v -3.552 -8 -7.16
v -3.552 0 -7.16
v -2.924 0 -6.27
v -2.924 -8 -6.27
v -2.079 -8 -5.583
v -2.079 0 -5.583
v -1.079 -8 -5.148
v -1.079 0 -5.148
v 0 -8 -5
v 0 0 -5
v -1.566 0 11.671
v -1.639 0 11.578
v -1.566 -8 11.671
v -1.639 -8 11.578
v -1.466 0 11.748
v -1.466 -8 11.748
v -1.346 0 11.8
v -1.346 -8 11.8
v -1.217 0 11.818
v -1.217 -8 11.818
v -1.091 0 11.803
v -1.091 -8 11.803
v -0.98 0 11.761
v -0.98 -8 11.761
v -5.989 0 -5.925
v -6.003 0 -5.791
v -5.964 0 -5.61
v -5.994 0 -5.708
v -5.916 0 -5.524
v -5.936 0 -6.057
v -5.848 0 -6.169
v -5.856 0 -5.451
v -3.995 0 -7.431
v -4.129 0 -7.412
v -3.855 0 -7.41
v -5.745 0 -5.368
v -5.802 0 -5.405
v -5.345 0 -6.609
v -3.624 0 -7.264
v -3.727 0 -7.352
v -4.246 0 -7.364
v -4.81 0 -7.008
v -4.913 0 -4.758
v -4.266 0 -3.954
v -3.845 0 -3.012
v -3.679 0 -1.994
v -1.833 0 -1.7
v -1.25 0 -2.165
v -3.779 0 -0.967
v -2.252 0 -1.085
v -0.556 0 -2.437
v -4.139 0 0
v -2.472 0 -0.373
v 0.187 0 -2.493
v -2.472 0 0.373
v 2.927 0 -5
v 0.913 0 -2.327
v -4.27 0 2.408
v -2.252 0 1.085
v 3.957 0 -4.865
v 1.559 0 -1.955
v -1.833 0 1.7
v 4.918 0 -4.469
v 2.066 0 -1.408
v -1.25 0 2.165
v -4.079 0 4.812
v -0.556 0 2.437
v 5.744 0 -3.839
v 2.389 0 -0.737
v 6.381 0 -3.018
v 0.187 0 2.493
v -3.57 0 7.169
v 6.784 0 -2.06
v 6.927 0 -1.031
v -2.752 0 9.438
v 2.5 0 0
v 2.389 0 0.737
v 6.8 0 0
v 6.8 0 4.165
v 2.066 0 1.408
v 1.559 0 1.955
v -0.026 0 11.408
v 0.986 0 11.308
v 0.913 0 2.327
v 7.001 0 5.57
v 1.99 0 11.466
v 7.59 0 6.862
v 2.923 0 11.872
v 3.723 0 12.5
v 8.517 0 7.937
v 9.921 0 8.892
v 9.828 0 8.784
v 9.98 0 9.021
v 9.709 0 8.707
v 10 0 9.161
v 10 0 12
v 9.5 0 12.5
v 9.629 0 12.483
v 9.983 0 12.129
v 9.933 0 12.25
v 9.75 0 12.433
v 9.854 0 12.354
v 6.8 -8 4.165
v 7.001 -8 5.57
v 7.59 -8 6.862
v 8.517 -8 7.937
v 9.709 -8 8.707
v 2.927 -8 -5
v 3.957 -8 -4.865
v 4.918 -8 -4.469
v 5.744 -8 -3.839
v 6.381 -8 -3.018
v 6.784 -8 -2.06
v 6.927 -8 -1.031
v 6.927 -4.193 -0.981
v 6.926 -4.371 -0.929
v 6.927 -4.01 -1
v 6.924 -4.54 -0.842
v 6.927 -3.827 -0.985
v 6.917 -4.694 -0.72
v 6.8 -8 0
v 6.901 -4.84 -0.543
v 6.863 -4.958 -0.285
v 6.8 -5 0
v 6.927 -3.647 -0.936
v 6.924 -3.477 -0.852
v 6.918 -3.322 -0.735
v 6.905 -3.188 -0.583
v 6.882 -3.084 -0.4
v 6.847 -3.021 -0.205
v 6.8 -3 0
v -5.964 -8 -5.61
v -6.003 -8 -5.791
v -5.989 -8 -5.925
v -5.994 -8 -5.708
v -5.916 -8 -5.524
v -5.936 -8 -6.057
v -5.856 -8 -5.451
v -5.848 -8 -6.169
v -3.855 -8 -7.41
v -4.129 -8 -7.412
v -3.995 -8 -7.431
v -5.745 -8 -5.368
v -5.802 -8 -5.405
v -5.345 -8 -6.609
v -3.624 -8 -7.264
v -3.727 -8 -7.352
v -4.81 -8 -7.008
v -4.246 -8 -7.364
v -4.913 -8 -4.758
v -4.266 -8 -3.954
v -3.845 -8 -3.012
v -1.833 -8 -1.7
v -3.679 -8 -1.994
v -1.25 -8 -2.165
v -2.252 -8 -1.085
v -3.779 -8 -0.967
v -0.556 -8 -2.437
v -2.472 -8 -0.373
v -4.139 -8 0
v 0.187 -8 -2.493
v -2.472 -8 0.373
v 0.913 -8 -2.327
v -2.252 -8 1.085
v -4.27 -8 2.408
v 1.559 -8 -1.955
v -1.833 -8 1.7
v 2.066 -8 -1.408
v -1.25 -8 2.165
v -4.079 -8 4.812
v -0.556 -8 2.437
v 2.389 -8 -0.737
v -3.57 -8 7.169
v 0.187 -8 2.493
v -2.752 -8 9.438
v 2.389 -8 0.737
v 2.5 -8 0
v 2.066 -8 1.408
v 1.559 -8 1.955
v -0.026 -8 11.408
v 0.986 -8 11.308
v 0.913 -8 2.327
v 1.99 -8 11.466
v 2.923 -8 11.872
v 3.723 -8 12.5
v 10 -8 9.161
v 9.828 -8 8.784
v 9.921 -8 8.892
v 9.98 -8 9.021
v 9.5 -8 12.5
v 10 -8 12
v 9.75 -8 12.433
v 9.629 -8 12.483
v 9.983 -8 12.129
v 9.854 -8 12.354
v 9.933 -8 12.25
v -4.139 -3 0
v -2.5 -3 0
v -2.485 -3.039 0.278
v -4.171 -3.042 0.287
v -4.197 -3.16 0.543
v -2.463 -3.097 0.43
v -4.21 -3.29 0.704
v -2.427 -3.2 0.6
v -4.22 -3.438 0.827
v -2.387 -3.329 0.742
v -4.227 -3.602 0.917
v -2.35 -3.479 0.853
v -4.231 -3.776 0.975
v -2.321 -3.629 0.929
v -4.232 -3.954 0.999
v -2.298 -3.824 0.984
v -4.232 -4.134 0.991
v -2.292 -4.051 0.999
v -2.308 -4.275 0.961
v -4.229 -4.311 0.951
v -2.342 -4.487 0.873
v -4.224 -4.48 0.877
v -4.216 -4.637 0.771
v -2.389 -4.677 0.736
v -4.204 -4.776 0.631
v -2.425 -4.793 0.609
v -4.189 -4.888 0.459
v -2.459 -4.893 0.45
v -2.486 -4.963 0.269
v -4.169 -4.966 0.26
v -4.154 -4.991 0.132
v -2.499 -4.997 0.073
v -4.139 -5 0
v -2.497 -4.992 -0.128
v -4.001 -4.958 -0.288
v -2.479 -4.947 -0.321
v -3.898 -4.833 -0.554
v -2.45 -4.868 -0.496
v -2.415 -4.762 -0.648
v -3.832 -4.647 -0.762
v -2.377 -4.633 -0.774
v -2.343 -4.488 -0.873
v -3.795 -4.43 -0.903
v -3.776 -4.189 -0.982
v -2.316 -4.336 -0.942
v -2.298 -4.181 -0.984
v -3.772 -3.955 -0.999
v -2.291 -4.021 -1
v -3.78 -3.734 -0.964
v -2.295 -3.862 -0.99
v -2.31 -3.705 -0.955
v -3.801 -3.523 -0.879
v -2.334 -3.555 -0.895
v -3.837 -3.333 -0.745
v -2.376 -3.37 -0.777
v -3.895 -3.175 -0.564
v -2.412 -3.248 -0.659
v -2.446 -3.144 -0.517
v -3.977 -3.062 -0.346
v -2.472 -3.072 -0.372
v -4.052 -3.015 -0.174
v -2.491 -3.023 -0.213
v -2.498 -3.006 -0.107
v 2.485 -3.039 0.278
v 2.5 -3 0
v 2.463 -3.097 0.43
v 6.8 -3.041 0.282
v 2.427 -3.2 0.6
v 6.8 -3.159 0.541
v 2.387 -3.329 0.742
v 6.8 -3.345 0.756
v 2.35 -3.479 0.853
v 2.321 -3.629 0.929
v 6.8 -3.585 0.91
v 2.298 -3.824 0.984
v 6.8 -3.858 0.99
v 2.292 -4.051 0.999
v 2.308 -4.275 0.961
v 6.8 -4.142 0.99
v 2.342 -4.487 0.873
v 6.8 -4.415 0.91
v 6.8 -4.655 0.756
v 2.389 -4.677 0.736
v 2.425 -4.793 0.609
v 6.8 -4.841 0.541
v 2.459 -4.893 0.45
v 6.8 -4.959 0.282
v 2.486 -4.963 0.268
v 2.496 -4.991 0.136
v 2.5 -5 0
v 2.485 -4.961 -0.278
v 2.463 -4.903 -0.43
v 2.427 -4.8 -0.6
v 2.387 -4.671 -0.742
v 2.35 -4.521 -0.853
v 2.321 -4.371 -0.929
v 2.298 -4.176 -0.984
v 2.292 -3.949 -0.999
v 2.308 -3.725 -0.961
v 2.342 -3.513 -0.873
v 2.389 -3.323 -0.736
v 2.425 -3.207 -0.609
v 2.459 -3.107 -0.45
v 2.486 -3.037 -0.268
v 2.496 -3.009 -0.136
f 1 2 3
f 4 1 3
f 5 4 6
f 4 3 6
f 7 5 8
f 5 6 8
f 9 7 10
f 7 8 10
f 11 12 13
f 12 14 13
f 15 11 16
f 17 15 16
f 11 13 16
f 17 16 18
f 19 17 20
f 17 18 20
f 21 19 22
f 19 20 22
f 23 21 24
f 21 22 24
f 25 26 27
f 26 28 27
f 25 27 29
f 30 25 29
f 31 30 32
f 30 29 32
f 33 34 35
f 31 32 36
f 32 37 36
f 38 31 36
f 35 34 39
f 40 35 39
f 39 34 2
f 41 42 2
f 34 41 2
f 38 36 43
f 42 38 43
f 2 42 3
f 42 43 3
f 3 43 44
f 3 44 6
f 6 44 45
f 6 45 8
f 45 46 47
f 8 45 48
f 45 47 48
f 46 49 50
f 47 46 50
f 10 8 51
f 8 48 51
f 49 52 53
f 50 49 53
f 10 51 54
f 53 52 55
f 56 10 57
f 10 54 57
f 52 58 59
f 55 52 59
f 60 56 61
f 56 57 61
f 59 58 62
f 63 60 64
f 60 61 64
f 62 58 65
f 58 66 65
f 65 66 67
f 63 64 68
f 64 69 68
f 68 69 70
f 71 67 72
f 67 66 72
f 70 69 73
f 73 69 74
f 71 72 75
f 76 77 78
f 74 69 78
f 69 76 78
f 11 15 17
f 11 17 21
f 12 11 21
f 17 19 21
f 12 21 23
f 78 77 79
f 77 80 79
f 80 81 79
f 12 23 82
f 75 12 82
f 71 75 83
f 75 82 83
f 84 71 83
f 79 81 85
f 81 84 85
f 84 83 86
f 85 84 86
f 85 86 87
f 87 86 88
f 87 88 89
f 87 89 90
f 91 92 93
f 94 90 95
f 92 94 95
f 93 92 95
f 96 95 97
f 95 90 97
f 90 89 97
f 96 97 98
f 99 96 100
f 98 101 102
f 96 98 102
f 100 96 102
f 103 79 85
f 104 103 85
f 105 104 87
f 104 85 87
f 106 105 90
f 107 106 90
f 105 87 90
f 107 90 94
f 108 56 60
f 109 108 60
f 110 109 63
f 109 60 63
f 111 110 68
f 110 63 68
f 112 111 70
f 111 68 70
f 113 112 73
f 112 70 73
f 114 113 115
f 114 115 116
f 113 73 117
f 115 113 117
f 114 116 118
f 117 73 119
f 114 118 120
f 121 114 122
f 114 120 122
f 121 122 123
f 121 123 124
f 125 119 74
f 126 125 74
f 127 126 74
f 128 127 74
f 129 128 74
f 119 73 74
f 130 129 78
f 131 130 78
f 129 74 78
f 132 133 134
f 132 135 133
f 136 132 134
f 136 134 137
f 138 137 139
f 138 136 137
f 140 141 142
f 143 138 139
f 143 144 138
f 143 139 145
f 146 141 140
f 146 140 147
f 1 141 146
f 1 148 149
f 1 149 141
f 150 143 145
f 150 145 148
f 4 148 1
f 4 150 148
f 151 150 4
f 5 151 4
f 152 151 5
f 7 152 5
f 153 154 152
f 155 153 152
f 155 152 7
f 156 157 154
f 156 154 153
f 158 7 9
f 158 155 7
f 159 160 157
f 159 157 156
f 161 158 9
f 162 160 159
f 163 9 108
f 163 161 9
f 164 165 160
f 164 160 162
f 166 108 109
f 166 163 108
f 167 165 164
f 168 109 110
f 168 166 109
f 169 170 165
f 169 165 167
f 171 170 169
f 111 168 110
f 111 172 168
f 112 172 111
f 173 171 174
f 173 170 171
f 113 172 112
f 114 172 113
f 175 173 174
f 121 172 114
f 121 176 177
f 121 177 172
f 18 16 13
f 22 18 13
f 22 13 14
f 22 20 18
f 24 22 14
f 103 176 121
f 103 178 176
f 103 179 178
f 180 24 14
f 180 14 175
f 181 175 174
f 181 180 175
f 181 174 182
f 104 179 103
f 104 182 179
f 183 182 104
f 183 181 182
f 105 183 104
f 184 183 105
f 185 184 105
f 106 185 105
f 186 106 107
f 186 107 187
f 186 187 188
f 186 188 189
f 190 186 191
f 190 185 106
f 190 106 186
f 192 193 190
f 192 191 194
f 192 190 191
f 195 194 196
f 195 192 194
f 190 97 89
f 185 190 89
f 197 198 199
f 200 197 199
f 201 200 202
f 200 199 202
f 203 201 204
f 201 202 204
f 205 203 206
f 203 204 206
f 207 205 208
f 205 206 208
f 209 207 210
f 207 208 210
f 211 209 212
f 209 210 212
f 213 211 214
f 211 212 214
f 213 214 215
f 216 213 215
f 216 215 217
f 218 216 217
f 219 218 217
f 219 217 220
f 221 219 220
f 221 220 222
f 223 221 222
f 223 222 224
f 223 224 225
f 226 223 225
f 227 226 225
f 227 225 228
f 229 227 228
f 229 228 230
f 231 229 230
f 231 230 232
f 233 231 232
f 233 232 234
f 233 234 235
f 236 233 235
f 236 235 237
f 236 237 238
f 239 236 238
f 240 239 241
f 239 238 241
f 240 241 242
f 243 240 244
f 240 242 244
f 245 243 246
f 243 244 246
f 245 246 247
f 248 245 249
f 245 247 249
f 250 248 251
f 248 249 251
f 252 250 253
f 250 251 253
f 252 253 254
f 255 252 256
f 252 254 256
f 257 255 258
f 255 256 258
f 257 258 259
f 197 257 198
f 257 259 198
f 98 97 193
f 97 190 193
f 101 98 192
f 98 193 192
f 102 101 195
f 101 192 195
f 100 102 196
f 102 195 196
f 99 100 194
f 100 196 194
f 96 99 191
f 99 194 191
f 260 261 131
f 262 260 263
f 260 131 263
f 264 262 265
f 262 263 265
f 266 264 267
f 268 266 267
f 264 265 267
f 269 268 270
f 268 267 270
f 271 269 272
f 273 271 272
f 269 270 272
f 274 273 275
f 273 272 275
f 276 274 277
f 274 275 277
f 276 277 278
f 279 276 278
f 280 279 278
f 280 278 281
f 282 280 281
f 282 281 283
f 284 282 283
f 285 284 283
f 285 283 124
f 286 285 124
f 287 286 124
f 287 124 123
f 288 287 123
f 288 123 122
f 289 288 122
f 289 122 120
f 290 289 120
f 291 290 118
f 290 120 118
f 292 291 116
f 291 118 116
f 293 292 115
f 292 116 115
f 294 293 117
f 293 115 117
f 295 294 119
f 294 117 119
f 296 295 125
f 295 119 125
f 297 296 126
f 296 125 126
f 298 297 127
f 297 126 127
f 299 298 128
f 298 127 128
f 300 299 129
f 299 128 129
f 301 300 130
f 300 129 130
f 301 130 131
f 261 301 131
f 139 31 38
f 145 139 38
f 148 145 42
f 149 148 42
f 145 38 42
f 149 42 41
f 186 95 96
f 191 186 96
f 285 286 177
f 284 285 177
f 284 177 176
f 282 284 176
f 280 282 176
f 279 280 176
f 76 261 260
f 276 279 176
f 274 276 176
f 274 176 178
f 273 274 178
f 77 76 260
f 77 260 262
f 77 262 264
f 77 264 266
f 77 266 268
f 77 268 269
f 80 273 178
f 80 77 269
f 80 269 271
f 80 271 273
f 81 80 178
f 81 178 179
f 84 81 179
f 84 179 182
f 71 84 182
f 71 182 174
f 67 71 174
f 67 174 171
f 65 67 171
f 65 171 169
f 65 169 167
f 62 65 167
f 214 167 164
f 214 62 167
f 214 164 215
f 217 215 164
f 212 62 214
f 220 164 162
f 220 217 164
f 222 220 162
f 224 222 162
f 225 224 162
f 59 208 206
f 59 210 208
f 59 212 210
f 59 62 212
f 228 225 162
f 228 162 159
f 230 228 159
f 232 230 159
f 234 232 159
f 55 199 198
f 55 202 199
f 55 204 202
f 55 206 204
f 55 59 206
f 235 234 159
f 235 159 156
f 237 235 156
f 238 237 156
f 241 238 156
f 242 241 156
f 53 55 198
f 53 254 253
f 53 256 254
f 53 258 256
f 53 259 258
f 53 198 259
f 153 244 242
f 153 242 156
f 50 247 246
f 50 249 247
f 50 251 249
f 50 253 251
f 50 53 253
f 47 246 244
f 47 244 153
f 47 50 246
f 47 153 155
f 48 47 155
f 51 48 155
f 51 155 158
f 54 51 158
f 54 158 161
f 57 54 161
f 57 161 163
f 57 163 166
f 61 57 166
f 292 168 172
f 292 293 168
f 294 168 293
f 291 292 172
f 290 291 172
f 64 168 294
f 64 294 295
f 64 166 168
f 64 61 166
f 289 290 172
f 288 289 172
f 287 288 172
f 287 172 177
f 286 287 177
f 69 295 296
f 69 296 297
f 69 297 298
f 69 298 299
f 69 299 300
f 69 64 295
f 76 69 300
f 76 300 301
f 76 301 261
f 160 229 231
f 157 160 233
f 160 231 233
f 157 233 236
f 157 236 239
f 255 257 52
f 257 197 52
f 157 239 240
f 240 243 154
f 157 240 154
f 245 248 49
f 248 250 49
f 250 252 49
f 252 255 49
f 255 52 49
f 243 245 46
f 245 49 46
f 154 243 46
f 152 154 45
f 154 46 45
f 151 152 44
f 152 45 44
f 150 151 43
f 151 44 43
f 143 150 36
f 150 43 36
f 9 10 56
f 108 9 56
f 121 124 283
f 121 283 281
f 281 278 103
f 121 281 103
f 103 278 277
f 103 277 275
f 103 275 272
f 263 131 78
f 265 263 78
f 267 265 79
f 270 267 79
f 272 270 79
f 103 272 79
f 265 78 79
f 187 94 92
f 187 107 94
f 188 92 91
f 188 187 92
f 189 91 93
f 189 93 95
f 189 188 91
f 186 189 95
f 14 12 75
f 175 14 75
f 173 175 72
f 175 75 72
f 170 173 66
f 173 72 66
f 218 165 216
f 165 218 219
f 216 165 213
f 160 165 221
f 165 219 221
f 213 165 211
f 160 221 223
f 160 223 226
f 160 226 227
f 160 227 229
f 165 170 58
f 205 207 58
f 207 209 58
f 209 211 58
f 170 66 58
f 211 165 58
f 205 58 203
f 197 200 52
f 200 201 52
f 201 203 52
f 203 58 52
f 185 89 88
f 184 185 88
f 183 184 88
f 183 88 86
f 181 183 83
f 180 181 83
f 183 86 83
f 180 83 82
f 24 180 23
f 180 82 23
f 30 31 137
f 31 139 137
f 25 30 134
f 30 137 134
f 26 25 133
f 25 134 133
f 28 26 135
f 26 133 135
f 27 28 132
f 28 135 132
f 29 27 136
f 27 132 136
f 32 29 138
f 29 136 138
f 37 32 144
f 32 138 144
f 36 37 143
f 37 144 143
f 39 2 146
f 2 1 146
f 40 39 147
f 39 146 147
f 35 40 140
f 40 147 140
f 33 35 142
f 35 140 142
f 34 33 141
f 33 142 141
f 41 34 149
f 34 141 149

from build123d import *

# Parameters (mm, degrees)
F0_R     = 2.5
F1_DEPTH = 8
F2_R     = 0.5
F4_R     = 1
F5_DEPTH = 16.0046179008


with BuildPart() as f1:
    # F0 (on Front) → F1 (new body)
    with BuildSketch(Plane.XZ):
        with BuildLine():
            ThreePointArc((-3.7562448003, -7.625), (-2.2912878475, -5.7212807378), (0, -5))
            Line((0, -5), (2.9270166538, -5))
            ThreePointArc((2.9270166538, -5), (6.089294314, -3.4494897428), (6.8, 0))
            Line((6.8, 0), (6.8, 4.1654431261))
            ThreePointArc((6.8, 4.1654431261), (7.6768943744, 6.9938702509), (10, 8.830204642))
            Line((10, 8.830204642), (10, 12.5))
            Line((10, 12.5), (3.7225915585, 12.5))
            ThreePointArc((3.7225915585, 12.5), (1.2642823664, 11.3254788413), (-1.3759608742, 11.9977136707))
            ThreePointArc((-1.3759608742, 11.9977136707), (-3.8097222151, 6.2411904989), (-4.1388034343, 0))
            ThreePointArc((-4.1388034343, 0), (-3.9545717948, -3.3296918319), (-6.3576388045, -5.6418462255))
            ThreePointArc((-6.3576388045, -5.6418462255), (-5.1532402541, -6.7597422202), (-3.7562448003, -7.625))
        make_face()
        Circle(F0_R, mode=Mode.SUBTRACT)
    extrude(amount=F1_DEPTH)

    # F2
    f2_edges = [f1.edges().sort_by_distance(p)[0] for p in [
        (10, -4, 12.5),
        (-1.375961, -4, 11.997714),
        (-6.357639, -4, -5.641846),
        (-3.756245, -4, -7.625),
        (10, -4, 8.830205),
    ]]
    fillet(f2_edges, radius=F2_R)

    # F4 (on face) → F5 (cut, through all)
    with BuildSketch(Plane.YZ.offset(10)):
        with Locations((-4, 0)):
            Circle(F4_R)
    extrude(amount=-F5_DEPTH, mode=Mode.SUBTRACT)


solid = f1.part
